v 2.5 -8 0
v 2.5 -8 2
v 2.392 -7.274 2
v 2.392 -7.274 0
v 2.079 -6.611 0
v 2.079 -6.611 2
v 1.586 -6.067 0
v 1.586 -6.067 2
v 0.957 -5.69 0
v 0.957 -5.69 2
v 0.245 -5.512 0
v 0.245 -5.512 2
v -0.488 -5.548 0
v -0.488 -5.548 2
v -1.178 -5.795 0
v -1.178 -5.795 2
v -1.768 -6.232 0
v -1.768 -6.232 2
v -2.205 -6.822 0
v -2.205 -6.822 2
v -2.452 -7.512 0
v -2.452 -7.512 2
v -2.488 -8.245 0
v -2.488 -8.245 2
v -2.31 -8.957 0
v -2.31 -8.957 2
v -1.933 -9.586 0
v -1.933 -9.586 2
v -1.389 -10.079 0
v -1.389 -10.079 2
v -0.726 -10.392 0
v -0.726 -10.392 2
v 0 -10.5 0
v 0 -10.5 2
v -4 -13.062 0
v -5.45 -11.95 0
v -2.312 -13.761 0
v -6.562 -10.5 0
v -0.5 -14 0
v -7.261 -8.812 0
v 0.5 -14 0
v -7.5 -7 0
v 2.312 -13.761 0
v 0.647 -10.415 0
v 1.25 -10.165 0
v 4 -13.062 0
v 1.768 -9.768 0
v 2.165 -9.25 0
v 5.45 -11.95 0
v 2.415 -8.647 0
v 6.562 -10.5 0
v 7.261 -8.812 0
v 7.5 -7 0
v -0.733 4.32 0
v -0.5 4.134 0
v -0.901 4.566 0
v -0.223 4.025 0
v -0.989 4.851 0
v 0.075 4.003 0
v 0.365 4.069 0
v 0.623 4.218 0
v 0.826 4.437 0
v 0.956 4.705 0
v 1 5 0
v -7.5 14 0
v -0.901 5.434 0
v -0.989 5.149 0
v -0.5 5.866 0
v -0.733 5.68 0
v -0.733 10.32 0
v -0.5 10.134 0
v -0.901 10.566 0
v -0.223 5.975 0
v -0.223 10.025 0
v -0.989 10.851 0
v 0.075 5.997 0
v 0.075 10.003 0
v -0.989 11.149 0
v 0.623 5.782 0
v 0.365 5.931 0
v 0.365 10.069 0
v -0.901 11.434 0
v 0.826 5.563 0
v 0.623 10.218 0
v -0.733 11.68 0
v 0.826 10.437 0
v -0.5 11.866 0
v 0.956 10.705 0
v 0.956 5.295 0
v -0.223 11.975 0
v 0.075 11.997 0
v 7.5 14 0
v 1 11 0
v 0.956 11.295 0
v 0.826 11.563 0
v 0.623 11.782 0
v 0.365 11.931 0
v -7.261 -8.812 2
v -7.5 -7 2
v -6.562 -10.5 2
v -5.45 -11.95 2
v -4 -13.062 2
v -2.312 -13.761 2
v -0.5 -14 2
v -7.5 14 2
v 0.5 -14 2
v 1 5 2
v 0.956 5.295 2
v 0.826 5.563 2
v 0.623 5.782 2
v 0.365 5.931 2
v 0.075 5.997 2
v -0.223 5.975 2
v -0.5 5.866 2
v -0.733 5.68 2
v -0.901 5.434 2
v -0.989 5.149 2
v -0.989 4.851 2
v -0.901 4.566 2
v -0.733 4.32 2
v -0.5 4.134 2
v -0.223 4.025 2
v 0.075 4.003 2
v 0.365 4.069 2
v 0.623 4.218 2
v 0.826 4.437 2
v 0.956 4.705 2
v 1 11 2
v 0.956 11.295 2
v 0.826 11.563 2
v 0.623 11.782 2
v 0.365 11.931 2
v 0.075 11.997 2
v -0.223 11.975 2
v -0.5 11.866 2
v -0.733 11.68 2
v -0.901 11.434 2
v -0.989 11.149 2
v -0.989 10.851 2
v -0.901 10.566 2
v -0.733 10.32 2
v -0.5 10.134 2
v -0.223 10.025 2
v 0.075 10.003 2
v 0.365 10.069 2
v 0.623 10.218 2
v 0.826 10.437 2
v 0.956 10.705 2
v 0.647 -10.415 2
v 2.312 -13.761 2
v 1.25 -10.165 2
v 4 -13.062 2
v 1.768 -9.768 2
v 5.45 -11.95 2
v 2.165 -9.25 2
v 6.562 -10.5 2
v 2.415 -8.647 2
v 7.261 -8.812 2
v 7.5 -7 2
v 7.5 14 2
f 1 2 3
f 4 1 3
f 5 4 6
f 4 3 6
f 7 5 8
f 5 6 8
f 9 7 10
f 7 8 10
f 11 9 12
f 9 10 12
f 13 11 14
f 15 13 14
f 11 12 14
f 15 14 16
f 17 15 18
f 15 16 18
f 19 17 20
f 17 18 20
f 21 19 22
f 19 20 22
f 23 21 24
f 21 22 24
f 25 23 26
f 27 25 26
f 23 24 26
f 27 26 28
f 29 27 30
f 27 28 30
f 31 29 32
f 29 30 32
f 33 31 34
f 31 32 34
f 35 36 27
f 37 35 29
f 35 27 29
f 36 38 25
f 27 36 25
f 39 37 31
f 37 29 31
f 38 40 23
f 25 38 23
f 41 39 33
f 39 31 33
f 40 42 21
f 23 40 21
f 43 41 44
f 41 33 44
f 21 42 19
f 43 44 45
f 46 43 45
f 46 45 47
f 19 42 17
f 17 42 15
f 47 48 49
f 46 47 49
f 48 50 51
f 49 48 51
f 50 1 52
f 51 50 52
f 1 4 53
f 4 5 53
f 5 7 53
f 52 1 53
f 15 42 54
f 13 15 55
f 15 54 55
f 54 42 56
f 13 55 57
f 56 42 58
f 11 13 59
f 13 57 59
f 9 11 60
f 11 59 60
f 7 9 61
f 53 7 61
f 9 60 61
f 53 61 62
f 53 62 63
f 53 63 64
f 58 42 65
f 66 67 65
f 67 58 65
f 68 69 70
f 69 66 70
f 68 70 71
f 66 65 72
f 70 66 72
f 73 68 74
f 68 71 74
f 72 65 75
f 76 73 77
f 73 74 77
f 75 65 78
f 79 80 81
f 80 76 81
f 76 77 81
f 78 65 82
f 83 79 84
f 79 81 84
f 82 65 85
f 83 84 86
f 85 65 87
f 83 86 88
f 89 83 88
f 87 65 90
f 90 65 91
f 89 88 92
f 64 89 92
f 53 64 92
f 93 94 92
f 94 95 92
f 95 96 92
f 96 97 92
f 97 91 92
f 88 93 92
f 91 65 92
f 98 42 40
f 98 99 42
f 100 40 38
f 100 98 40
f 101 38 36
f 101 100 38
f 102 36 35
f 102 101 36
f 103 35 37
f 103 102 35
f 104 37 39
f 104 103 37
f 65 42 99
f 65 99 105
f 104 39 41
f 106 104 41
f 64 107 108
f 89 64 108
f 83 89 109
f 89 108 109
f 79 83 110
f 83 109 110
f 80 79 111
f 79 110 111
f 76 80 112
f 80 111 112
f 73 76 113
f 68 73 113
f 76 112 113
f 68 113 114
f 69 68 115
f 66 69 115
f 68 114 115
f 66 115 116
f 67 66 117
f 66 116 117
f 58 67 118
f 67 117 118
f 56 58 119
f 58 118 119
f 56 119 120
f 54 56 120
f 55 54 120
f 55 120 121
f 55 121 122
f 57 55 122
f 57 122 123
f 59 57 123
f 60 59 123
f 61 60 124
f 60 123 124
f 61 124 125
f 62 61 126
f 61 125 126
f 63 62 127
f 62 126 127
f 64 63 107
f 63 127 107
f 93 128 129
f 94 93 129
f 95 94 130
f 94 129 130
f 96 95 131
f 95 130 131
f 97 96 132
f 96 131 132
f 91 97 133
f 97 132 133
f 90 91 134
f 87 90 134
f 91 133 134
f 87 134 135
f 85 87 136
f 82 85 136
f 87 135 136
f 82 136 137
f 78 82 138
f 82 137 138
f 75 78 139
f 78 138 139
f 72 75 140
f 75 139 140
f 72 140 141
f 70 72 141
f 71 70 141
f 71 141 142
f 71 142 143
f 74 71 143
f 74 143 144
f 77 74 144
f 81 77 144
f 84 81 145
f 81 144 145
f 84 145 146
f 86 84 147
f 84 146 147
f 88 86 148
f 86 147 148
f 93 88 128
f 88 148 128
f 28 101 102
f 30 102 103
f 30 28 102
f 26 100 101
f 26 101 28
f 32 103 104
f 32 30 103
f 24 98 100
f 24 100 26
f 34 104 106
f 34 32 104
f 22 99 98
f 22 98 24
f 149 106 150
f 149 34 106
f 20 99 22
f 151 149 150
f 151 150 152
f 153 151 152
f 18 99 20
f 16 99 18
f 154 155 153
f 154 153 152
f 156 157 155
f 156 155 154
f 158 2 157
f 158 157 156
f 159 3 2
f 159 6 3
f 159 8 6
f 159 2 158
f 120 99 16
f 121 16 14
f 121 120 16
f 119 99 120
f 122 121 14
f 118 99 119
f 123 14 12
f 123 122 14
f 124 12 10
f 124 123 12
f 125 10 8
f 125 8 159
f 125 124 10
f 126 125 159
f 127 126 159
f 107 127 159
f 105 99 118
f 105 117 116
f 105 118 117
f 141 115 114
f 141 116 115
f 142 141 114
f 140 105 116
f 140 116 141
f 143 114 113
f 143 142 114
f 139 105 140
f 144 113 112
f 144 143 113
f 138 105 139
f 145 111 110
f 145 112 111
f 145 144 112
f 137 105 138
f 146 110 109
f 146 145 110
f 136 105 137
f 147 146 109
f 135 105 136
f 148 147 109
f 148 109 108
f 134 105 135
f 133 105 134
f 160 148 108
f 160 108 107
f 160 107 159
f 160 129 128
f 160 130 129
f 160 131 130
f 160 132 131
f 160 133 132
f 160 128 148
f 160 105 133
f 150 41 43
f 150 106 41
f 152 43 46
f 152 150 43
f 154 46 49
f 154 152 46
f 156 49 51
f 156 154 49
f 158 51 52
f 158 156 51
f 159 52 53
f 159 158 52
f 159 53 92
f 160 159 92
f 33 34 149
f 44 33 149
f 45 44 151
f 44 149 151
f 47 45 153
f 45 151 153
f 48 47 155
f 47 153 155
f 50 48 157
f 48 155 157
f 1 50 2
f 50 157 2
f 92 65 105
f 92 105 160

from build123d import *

# Parameters (mm, degrees)
F0_W     = 15
F0_H     = 28
F1_DEPTH = 2
F2_R     = 7
F3_R     = 1
F4_DEPTH = 2


with BuildPart() as f1:
    # F0 (on Top) → F1 (new body)
    with BuildSketch(Plane.XY):
        Rectangle(F0_W, F0_H)
    extrude(amount=F1_DEPTH)

    # F2
    f2_edges = [f1.edges().sort_by_distance(p)[0] for p in [
        (-7.5, -14, 1),
        (7.5, -14, 1),
    ]]
    fillet(f2_edges, radius=F2_R)

    # F3 (on face) → F4 (cut, through all)
    with BuildSketch(Plane.XY.offset(2)):
        with BuildLine():
            ThreePointArc((0, -10.5), (1.767767, -9.767767), (2.5, -8))
            ThreePointArc((2.5, -8), (-1.767767, -6.232233), (0, -10.5))
        make_face()
        with Locations((0, 5)):
            Circle(F3_R)
        with Locations((0, 11)):
            Circle(F3_R)
    extrude(amount=-F4_DEPTH, mode=Mode.SUBTRACT)


solid = f1.part
